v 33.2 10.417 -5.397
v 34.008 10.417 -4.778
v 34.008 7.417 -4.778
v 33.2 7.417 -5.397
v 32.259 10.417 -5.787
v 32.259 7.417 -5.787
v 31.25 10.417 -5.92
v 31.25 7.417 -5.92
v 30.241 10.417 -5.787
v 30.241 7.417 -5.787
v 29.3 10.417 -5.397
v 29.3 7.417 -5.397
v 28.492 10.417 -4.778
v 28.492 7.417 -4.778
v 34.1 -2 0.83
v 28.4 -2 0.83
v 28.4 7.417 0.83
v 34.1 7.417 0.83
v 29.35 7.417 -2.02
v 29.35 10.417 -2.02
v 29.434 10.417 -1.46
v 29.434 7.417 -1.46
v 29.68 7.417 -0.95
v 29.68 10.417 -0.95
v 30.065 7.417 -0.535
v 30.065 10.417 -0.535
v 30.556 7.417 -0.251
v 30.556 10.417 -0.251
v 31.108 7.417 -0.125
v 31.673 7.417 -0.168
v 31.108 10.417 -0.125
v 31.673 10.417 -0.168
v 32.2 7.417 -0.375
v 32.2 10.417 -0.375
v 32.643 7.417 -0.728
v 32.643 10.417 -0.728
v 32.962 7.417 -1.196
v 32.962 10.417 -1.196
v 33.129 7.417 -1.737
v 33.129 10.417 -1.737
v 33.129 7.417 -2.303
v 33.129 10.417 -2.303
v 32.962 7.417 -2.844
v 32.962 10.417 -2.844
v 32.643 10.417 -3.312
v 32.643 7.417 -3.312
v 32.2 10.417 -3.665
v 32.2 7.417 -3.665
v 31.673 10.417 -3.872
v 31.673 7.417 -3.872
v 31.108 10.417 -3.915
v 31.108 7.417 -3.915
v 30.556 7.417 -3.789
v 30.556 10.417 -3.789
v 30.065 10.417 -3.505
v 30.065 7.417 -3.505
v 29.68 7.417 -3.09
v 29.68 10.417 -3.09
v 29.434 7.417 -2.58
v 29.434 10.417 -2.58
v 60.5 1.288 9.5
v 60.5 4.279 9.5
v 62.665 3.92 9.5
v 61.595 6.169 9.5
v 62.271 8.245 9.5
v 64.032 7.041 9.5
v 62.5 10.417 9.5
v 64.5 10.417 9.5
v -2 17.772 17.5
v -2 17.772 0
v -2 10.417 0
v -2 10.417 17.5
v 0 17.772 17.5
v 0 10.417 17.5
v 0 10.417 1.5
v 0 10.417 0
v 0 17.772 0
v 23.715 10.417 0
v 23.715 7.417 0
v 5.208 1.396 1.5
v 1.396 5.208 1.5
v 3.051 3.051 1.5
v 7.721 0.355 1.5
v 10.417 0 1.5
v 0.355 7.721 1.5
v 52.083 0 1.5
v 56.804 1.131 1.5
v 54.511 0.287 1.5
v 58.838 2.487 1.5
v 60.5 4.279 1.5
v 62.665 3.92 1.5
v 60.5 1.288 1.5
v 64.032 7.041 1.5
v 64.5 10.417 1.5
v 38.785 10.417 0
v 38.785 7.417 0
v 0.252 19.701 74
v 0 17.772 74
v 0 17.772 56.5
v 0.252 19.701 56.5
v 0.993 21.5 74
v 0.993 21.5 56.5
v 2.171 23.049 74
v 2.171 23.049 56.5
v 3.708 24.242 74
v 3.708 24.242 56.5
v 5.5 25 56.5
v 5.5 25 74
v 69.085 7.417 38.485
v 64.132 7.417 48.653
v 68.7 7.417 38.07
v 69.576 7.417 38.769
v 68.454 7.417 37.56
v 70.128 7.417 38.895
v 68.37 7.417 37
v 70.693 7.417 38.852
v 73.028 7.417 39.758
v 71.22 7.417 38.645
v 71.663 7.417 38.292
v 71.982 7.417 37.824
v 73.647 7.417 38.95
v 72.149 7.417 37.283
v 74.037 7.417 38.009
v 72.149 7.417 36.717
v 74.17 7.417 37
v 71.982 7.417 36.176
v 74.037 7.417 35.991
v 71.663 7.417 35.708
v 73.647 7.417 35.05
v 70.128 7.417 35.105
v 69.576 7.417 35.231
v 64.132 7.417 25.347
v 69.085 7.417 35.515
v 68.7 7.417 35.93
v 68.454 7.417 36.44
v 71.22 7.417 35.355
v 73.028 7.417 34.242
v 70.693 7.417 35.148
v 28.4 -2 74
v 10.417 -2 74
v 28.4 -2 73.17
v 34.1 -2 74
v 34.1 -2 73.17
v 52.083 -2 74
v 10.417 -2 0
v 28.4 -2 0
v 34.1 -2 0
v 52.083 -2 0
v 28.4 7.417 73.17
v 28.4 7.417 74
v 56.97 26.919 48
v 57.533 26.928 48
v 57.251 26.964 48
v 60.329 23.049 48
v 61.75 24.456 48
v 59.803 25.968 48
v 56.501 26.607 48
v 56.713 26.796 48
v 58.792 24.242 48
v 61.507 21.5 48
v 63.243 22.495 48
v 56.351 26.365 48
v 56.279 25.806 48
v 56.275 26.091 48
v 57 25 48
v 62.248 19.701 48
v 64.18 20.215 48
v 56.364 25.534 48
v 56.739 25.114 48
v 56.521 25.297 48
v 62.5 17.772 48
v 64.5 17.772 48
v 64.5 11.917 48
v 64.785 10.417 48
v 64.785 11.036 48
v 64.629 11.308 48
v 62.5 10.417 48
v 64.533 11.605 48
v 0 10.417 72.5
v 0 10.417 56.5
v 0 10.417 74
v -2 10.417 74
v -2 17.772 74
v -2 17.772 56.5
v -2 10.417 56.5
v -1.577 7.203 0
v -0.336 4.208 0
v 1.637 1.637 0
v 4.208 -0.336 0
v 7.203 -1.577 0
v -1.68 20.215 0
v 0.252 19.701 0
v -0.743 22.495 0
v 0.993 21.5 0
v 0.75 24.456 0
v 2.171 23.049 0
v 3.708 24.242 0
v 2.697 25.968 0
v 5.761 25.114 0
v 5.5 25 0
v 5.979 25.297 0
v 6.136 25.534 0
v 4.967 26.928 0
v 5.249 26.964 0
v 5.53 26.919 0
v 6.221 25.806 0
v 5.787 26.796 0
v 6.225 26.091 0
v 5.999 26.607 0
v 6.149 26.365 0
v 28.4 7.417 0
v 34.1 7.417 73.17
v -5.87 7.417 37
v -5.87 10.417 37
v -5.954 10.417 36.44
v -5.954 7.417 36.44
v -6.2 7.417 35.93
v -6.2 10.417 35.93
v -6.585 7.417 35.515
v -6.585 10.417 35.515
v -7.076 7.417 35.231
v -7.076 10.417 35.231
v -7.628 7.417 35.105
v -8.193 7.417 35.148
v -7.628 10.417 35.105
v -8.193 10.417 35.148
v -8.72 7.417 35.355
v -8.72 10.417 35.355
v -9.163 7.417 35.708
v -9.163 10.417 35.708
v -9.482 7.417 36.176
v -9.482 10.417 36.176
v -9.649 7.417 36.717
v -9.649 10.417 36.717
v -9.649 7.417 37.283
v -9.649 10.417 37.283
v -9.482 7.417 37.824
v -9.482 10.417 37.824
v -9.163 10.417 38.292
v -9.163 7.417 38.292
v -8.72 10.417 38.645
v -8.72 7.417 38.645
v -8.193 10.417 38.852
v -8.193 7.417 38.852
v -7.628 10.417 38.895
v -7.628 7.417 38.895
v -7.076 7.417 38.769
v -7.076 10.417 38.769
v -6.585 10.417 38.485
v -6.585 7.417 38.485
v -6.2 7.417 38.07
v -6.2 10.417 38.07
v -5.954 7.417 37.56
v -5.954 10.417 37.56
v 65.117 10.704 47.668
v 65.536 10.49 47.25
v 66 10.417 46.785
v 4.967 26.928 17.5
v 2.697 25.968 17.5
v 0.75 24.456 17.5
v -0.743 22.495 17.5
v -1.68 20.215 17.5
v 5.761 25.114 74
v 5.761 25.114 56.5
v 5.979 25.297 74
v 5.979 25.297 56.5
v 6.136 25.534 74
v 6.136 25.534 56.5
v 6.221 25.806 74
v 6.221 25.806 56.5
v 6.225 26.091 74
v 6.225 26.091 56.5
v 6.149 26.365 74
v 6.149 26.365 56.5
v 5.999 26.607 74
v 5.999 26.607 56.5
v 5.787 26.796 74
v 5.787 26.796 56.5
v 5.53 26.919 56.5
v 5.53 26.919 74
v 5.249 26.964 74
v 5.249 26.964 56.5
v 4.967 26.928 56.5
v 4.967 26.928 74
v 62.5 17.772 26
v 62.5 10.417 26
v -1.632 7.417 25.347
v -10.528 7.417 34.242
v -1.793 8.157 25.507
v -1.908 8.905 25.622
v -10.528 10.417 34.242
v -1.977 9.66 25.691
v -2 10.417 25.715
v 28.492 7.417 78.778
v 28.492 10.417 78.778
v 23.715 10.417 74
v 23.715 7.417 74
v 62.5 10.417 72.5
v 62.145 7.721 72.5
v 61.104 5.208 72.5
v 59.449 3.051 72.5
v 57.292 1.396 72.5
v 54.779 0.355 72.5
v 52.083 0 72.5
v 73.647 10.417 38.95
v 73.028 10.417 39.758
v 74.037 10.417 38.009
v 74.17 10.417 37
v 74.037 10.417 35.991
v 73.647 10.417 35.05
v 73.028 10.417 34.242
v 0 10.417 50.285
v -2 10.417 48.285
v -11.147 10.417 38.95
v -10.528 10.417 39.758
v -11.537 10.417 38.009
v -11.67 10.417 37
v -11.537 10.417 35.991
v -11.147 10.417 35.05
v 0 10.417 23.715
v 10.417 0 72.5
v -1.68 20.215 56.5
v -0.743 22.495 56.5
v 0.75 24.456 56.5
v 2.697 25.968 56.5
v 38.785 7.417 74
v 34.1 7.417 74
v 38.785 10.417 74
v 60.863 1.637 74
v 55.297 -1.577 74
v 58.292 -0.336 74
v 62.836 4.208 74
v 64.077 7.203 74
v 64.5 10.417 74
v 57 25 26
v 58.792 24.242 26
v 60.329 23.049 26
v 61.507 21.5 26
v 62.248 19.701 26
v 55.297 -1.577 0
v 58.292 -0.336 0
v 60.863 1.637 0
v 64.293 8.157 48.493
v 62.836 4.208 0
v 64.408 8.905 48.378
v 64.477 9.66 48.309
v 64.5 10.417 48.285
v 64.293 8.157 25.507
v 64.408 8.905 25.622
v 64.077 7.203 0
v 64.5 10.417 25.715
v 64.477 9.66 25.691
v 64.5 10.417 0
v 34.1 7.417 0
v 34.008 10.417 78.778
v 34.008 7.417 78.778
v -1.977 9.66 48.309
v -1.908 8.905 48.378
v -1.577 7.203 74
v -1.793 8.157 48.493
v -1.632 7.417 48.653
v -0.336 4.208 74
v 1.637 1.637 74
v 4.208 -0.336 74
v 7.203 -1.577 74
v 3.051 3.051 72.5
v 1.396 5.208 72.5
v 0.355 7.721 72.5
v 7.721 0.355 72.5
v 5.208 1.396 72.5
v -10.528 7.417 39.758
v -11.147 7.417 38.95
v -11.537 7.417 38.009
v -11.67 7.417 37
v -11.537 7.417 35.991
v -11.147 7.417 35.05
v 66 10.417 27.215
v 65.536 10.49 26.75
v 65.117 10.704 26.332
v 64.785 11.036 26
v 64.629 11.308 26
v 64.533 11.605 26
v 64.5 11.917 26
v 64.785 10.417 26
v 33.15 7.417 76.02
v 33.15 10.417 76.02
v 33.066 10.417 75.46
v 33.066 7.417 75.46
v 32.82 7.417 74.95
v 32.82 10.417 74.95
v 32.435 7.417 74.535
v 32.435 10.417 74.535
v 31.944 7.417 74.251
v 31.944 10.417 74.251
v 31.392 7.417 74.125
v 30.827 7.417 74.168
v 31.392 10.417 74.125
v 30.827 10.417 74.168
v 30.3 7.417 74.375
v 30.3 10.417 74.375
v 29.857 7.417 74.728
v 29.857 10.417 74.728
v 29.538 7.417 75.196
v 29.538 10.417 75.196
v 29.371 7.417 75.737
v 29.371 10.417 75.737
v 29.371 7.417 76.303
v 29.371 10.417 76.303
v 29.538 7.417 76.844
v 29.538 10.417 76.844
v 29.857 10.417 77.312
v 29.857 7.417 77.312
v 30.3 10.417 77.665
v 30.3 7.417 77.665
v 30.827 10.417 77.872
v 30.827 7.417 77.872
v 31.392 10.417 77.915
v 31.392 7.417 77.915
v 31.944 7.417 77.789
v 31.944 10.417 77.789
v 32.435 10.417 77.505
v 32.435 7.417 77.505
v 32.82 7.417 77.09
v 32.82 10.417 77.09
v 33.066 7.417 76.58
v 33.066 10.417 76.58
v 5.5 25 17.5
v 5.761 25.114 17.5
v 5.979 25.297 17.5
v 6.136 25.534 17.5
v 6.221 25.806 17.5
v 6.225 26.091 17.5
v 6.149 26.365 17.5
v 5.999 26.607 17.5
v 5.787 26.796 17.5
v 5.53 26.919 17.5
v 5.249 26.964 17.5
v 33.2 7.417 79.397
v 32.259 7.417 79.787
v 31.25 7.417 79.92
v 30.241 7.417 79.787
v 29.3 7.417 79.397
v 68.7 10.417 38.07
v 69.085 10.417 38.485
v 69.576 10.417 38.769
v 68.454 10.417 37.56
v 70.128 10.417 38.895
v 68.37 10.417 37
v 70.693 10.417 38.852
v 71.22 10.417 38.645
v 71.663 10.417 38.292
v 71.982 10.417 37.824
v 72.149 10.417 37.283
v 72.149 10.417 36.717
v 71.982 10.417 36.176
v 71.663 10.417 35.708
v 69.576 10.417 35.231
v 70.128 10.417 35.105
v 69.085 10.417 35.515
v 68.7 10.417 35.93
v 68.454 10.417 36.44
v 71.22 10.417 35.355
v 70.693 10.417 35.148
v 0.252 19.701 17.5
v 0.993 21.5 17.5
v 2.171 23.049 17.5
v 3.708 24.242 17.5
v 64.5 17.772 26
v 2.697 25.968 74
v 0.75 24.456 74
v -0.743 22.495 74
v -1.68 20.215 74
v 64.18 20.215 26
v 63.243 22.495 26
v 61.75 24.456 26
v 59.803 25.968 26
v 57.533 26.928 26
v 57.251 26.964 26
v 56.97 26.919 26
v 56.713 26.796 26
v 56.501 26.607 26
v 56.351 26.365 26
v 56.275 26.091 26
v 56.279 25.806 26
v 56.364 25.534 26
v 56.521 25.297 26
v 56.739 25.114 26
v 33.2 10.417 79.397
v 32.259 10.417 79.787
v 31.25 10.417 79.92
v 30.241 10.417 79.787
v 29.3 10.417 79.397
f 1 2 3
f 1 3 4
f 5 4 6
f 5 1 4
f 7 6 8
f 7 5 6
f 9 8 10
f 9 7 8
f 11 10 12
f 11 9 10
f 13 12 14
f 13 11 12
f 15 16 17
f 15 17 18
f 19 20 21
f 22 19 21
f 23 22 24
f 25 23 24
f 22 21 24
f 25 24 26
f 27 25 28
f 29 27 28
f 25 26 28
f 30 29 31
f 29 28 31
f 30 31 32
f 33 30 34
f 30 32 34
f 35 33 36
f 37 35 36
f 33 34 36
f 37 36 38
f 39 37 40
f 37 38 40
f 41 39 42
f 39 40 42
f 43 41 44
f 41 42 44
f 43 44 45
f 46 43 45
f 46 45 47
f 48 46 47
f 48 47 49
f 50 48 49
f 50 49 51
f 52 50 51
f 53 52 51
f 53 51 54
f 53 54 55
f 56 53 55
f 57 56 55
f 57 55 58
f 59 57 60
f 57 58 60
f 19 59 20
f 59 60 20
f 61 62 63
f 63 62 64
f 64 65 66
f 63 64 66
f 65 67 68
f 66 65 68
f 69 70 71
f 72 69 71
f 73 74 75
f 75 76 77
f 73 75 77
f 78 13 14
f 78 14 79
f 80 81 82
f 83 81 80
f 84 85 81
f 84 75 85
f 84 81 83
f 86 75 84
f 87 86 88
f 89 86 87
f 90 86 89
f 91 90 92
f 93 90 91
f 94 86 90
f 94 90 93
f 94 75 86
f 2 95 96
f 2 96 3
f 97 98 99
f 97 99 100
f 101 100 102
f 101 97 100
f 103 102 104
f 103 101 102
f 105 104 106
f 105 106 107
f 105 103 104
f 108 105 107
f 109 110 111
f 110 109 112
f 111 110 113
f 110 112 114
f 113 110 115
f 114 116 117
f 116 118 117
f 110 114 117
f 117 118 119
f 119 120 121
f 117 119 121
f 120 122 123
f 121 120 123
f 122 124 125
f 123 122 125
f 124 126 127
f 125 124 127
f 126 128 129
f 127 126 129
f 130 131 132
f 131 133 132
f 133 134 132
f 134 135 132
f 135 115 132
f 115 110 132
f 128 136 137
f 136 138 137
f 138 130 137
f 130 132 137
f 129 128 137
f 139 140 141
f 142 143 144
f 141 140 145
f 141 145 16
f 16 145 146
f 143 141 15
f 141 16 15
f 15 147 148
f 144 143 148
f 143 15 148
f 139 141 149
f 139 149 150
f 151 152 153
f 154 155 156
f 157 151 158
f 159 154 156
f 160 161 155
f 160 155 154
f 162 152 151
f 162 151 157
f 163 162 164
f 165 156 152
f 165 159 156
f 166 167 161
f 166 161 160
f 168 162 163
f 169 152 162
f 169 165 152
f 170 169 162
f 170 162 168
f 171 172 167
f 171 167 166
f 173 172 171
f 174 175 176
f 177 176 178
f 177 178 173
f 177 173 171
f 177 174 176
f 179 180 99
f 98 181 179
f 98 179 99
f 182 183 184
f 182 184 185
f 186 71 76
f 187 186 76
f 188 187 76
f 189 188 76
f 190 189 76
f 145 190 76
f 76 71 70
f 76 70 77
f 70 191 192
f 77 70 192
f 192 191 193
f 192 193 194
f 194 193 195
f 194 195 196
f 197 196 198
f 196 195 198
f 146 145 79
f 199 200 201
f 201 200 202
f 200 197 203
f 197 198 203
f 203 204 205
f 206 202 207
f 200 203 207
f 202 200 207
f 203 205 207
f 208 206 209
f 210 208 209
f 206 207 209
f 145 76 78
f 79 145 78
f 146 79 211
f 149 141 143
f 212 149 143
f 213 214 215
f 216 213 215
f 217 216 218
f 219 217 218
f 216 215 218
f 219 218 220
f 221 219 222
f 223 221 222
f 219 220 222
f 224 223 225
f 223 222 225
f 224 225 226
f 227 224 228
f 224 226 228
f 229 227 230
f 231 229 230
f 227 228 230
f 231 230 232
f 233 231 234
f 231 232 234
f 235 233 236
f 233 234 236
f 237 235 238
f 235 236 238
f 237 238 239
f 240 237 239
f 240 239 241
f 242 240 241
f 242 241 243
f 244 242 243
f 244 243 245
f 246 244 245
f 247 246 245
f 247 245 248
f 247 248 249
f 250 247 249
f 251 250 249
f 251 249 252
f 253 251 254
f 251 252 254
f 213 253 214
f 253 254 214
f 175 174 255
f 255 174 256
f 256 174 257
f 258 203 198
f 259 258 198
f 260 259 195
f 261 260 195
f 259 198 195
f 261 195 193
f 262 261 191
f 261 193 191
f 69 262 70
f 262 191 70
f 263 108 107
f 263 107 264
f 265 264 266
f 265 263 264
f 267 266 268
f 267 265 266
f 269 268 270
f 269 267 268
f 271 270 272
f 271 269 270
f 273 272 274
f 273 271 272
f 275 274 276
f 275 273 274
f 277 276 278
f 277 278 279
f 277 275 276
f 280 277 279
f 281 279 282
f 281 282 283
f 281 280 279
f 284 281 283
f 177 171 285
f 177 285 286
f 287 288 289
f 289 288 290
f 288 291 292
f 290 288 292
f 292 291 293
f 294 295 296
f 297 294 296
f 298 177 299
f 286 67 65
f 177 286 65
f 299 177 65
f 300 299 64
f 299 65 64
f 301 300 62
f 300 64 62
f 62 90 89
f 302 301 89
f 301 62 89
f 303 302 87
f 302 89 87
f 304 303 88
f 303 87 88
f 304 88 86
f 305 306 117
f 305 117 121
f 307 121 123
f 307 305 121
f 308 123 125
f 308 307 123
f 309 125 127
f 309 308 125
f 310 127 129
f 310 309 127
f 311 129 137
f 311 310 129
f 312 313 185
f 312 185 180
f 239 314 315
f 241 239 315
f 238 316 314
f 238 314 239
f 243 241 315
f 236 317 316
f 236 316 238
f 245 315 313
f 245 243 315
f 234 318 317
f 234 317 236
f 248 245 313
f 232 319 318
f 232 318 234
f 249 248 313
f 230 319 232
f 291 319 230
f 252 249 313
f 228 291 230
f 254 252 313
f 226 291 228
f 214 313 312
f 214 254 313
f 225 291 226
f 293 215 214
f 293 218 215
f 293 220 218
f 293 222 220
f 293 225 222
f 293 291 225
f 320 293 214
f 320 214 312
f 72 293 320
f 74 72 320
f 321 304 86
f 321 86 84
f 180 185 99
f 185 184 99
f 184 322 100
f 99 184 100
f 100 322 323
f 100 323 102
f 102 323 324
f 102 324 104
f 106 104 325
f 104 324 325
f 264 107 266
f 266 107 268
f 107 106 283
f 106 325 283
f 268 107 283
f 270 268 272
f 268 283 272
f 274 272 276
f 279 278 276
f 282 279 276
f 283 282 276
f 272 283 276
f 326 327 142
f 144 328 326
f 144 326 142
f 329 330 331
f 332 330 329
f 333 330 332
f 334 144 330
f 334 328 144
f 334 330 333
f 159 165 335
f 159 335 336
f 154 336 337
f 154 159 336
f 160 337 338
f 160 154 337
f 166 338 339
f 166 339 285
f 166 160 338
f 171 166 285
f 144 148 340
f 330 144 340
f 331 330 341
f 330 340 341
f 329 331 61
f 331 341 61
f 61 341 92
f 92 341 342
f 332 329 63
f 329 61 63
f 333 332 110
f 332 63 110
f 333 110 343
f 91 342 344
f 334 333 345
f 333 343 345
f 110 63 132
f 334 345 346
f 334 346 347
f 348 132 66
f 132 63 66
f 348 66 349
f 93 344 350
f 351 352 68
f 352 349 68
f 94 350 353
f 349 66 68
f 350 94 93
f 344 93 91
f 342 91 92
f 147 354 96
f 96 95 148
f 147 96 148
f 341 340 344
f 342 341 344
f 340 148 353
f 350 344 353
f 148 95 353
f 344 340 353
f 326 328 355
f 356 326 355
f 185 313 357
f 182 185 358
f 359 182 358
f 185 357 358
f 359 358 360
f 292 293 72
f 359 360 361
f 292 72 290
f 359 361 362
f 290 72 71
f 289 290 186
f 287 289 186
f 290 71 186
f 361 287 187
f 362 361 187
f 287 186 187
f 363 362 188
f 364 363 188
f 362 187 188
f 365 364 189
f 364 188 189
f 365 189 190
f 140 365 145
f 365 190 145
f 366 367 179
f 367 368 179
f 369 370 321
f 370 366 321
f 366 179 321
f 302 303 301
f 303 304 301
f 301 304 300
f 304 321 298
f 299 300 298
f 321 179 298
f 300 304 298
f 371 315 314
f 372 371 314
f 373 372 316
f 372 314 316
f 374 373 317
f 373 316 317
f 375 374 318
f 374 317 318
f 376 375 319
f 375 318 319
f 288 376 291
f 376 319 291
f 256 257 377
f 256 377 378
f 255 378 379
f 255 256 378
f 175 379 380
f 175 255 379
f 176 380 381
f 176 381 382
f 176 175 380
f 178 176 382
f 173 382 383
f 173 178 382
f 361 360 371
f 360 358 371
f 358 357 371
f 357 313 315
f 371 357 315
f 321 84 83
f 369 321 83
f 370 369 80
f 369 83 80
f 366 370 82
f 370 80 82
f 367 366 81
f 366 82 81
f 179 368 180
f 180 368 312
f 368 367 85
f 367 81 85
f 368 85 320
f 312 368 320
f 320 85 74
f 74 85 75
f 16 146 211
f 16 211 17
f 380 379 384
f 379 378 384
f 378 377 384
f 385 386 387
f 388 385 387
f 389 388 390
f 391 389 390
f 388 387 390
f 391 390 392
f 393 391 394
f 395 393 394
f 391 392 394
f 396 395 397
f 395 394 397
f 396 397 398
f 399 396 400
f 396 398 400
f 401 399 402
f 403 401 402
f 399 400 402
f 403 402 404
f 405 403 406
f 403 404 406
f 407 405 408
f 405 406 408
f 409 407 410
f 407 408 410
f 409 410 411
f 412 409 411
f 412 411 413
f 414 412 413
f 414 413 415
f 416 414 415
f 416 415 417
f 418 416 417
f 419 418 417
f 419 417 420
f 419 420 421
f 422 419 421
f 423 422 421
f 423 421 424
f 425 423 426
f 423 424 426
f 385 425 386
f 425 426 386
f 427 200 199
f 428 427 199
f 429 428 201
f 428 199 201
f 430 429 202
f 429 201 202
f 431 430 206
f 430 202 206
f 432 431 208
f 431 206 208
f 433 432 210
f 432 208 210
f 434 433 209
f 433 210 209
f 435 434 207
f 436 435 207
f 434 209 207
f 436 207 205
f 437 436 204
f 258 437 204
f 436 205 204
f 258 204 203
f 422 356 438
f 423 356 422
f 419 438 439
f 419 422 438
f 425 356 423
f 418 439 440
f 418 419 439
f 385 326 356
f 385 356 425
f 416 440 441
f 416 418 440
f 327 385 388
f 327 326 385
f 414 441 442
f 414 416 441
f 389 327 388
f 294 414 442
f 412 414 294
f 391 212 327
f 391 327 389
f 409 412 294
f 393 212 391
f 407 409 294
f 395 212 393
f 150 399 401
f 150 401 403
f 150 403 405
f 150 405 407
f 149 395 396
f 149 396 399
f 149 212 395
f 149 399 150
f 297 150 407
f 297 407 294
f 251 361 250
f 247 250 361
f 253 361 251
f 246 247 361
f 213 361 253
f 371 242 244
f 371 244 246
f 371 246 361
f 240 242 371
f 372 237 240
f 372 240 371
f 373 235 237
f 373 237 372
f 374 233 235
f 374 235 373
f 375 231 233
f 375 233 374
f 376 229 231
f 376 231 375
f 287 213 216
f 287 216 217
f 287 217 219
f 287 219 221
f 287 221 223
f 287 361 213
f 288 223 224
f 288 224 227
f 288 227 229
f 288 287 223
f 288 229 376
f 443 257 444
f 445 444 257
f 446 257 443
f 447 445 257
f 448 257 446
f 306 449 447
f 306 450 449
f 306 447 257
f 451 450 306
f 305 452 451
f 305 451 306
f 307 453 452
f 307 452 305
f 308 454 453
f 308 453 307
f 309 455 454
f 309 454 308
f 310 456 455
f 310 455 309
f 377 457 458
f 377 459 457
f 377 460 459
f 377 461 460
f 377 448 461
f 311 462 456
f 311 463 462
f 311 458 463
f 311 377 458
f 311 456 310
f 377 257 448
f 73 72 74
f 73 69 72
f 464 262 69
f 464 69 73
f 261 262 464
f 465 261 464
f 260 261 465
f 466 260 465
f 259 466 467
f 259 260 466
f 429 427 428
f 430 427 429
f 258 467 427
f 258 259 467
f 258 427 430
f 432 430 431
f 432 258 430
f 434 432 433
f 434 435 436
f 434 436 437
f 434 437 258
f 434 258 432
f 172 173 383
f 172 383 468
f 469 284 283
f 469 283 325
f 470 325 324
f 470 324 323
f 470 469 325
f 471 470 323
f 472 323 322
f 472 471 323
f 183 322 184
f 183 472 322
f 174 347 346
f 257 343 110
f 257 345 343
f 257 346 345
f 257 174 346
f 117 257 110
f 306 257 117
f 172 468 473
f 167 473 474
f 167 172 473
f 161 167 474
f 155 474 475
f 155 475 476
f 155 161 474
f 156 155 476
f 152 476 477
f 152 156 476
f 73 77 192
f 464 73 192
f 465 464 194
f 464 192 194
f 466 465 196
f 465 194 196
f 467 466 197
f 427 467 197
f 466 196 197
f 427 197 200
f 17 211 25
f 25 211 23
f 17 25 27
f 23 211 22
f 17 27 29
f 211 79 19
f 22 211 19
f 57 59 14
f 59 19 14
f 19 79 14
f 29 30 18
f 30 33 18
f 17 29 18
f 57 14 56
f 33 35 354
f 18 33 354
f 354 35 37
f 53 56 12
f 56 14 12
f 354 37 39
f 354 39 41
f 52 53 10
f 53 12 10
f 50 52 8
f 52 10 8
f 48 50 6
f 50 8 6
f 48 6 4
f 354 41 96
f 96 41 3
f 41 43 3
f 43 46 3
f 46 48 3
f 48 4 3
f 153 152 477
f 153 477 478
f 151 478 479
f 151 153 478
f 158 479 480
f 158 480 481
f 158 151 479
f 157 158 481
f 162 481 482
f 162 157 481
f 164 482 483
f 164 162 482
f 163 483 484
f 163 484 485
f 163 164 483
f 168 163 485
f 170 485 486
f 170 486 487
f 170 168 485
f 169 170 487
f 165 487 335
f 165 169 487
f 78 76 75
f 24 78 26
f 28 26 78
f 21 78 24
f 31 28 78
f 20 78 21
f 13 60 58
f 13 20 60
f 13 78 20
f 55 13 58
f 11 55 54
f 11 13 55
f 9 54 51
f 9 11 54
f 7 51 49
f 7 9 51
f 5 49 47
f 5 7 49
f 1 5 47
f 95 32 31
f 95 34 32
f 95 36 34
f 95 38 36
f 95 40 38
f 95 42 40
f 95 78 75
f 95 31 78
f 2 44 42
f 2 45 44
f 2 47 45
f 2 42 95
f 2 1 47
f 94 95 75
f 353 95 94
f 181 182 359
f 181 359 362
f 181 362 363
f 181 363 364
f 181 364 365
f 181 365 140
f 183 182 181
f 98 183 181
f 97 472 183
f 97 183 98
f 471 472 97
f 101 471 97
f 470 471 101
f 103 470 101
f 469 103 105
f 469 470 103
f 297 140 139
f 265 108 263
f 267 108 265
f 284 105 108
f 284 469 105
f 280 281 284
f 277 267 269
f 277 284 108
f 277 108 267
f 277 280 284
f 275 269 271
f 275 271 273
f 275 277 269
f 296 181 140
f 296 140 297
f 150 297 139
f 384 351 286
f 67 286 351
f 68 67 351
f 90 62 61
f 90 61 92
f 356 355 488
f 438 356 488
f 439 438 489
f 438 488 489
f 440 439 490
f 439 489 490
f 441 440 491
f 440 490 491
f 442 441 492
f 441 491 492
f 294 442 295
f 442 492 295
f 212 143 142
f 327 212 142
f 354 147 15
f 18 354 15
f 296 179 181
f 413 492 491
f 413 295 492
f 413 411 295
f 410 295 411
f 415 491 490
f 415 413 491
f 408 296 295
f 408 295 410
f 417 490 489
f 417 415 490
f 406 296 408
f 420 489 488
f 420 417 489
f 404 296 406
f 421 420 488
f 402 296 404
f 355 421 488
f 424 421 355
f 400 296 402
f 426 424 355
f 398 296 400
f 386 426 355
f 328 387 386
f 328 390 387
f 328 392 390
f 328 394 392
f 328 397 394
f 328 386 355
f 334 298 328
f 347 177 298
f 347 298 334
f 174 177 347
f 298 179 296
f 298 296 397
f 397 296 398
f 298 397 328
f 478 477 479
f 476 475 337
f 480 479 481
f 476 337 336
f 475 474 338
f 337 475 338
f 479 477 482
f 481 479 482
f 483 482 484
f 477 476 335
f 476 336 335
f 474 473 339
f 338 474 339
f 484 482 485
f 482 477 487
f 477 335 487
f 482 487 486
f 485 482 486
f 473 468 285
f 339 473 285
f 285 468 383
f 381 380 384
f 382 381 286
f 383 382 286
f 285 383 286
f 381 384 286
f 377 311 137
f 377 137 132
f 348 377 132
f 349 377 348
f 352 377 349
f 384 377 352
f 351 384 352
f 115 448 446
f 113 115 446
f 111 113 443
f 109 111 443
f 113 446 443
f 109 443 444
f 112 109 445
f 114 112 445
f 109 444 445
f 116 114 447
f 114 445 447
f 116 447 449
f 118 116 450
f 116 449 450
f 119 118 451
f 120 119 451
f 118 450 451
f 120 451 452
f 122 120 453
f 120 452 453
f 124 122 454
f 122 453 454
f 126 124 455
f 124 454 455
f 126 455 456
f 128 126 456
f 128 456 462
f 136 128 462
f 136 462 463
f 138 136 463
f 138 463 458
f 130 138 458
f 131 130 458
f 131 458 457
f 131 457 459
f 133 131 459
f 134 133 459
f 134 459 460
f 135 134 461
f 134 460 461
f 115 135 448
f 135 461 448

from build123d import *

# Parameters (mm, degrees)
SKETCH1_R           = 10.416666668
SKETCH1_R_2         = 10.416666667
BOSS_EXTRUDE1_DEPTH = 65
FILLET1_R           = 2
BOSS_EXTRUDE2_DEPTH = 74
BOSS_EXTRUDE3_REACH = 100.947
SKETCH3_W           = 66.5
SKETCH3_H           = 1.5
SKETCH4_R           = 1.9
BOSS_EXTRUDE4_DEPTH = 3
SKETCH5_W           = 4
SKETCH5_H           = 8
CUT_EXTRUDE1_DEPTH  = 10
BOSS_EXTRUDE5_START = -26
BOSS_EXTRUDE5_DEPTH = 22
BOSS_EXTRUDE6_DEPTH = 17.5
FILLET2_R           = 1.5
SKETCH8_W           = 5.7
SKETCH8_H           = 0.83
CUT_EXTRUDE4_DEPTH  = 9.416666667


with BuildPart() as part:
    # Sketch1 → Boss-Extrude1 (new body)
    with BuildSketch(Plane.XY):
        with Locations((10.416666667, 10.416666667)):
            Circle(SKETCH1_R)
        with BuildLine():
            ThreePointArc((20.833333333, 10.416666667), (21.626254869, 14.402952421), (23.884304362, 17.782362305))
            ThreePointArc((23.884304363, 17.782362304), (20.833333333, 16.518608725), (17.782362304, 17.782362304))
            ThreePointArc((17.782362305, 17.782362305), (20.040411798, 14.402952421), (20.833333335, 10.416666667))
        make_face()
        with BuildLine():
            ThreePointArc((17.782362304, 3.050971029), (20.833333333, 4.314724608), (23.884304363, 3.050971029))
            ThreePointArc((23.884304362, 3.050971029), (21.626254869, 6.430380913), (20.833333333, 10.416666667))
            ThreePointArc((20.833333335, 10.416666667), (20.040411798, 6.430380912), (17.782362305, 3.050971028))
        make_face()
        with Locations((31.25, 10.416666667)):
            Circle(SKETCH1_R_2)
        with BuildLine():
            ThreePointArc((44.717637696, 3.050971029), (42.459588203, 6.430380913), (41.666666666, 10.416666667))
            ThreePointArc((41.666666667, 10.416666667), (40.873745131, 6.430380913), (38.615695638, 3.050971029))
            ThreePointArc((38.615695637, 3.050971029), (41.666666667, 4.314724608), (44.717637696, 3.050971029))
        make_face()
        with BuildLine():
            ThreePointArc((38.615695638, 17.782362305), (40.873745131, 14.402952421), (41.666666667, 10.416666667))
            ThreePointArc((41.666666666, 10.416666667), (42.459588203, 14.402952421), (44.717637696, 17.782362304))
            ThreePointArc((44.717637696, 17.782362304), (41.666666667, 16.518608725), (38.615695637, 17.782362304))
        make_face()
        with Locations((52.083333333, 10.416666667)):
            Circle(SKETCH1_R_2)
    extrude(amount=BOSS_EXTRUDE1_DEPTH)

    # Fillet1
    fillet1_edges = [part.edges().sort_by_distance(p)[0] for p in [
        (31.25, -1e-09, 65),
        (31.25, 20.833333334, 0),
        (41.666666667, 16.518608725, 0),
        (62.5, 10.416666667, 0),
        (41.666666667, 4.314724608, 0),
        (31.25, -1e-09, 0),
        (20.833333333, 4.314724608, 0),
        (41.666666667, 4.314724608, 65),
        (62.5, 10.416666667, 65),
        (41.666666667, 16.518608725, 65),
        (31.25, 20.833333334, 65),
        (20.833333333, 16.518608725, 65),
        (-1e-09, 10.416666667, 65),
        (20.833333333, 4.314724608, 65),
        (-1e-09, 10.416666667, 0),
        (20.833333333, 16.518608725, 0),
    ]]
    fillet(fillet1_edges, radius=FILLET1_R)


with BuildPart() as body_2:
    # Sketch2 → Boss-Extrude2 (new body)
    with BuildSketch(Plane(origin=(0, 0, 0), x_dir=(-1, 0, 0), z_dir=(0, 0, -1))):
        with BuildLine():
            Line((-52.083333333, 0), (-10.416666667, 0))
            ThreePointArc((-10.416666667, 0), (-3.050971029, 3.050971029), (1e-09, 10.416666667))
            Line((1e-09, 10.416666667), (2.000000001, 10.416666667))
            ThreePointArc((2.000000001, 10.416666667), (-1.636757467, 1.636757467), (-10.416666667, -2))
            Line((-10.416666667, -2), (-52.083333333, -2))
            ThreePointArc((-52.083333333, -2), (-60.863242533, 1.636757467), (-64.5, 10.416666667))
            Line((-64.5, 10.416666667), (-62.5, 10.416666667))
            ThreePointArc((-62.5, 10.416666667), (-59.449028971, 3.050971029), (-52.083333333, 0))
        make_face()
    extrude(amount=-BOSS_EXTRUDE2_DEPTH)

    # Sketch3 → Boss-Extrude3 (add, up to next)
    with BuildSketch(Plane(origin=(0, 10.416666667, 0), x_dir=(1, 0, 0), z_dir=(0, 1, 0)), mode=Mode.PRIVATE) as boss_extrude3_sk1:
        with Locations((31.25, -0.75)):
            Rectangle(SKETCH3_W, SKETCH3_H)
    boss_extrude3_tool1 = extrude(boss_extrude3_sk1.sketch, amount=-BOSS_EXTRUDE3_REACH, mode=Mode.PRIVATE) - body_2.part
    # Sketch3 → Boss-Extrude3 (add, up to next)
    with BuildSketch(Plane(origin=(0, 10.416666667, 0), x_dir=(1, 0, 0), z_dir=(0, 1, 0)), mode=Mode.PRIVATE) as boss_extrude3_sk2:
        with Locations((31.25, -73.25)):
            Rectangle(SKETCH3_W, SKETCH3_H)
    boss_extrude3_tool2 = extrude(boss_extrude3_sk2.sketch, amount=-BOSS_EXTRUDE3_REACH, mode=Mode.PRIVATE) - body_2.part
    add(boss_extrude3_tool1.solids().sort_by_distance((31.25, 10.416667, 0.75))[0])
    add(boss_extrude3_tool2.solids().sort_by_distance((31.25, 10.416667, 73.25))[0])

    # Sketch4 → Boss-Extrude4 (add)
    # profile 1 of 4: a face of its own
    with BuildSketch(Plane(origin=(0, 10.416666667, 0), x_dir=(1, 0, 0), z_dir=(0, 1, 0))):
        with BuildLine():
            Line((28.492283553, 4.777716447), (22.214567107, -1.5))
            Line((22.214567107, -1.5), (40.285432893, -1.5))
            Line((40.285432893, -1.5), (34.007716446, 4.777716447))
            ThreePointArc((34.007716446, 4.777716447), (31.25, 5.92), (28.492283553, 4.777716447))
        make_face()
        with Locations(Location((31.25, 2.02, 0), (0, 0, 180))):
            Circle(SKETCH4_R, mode=Mode.SUBTRACT)
    # profile 2 of 4: a face of its own
    with BuildSketch(Plane(origin=(0, 10.416666667, 0), x_dir=(1, 0, 0), z_dir=(0, 1, 0))):
        with BuildLine():
            Line((73.027716447, -34.242283553), (62.5, -23.714567107))
            Line((62.5, -23.714567107), (62.5, -50.285432893))
            Line((62.5, -50.285432893), (73.027716447, -39.757716447))
            ThreePointArc((73.027716447, -39.757716447), (74.17, -37), (73.027716447, -34.242283553))
        make_face()
        with Locations(Location((70.27, -37, 0), (0, 0, 180))):
            Circle(SKETCH4_R, mode=Mode.SUBTRACT)
    # profile 3 of 4: a face of its own
    with BuildSketch(Plane(origin=(0, 10.416666667, 0), x_dir=(1, 0, 0), z_dir=(0, 1, 0))):
        with BuildLine():
            Line((0, -23.714567107), (0, -50.285432893))
            Line((0, -50.285432893), (-10.527716447, -39.757716447))
            ThreePointArc((-10.527716447, -39.757716447), (-11.67, -37), (-10.527716447, -34.242283553))
            Line((-10.527716447, -34.242283553), (0, -23.714567107))
        make_face()
        with Locations((-7.77, -37)):
            Circle(SKETCH4_R, mode=Mode.SUBTRACT)
    # profile 4 of 4: a face of its own
    with BuildSketch(Plane(origin=(0, 10.416666667, 0), x_dir=(1, 0, 0), z_dir=(0, 1, 0))):
        with BuildLine():
            Line((22.214567107, -72.5), (40.285432893, -72.5))
            Line((40.285432893, -72.5), (34.007716446, -78.777716447))
            ThreePointArc((34.007716446, -78.777716447), (31.25, -79.92), (28.492283553, -78.777716447))
            Line((28.492283553, -78.777716447), (22.214567107, -72.5))
        make_face()
        with Locations((31.25, -76.02)):
            Circle(SKETCH4_R, mode=Mode.SUBTRACT)
    extrude(amount=-BOSS_EXTRUDE4_DEPTH)

    # Sketch5 → Cut-Extrude1 (cut)
    with BuildSketch(Plane(origin=(0, 10.416666667, 0), x_dir=(1, 0, 0), z_dir=(0, 1, 0))):
        with Locations((62.5, -5.5)):
            Rectangle(SKETCH5_W, SKETCH5_H)
    extrude(amount=-CUT_EXTRUDE1_DEPTH, mode=Mode.SUBTRACT)

    # Sketch6 → Boss-Extrude5 (add)
    with BuildSketch(Plane.XY.offset(74).offset(BOSS_EXTRUDE5_START)):
        with BuildLine():
            Line((62.5, 10.416666667), (64.5, 10.416666667))
            Line((64.5, 10.416666667), (64.5, 12.416666667))
            Line((64.5, 12.416666667), (64.5, 17.771583853))
            ThreePointArc((64.5, 17.771583853), (62.560313045, 23.524119525), (57.533333333, 26.927577639))
            ThreePointArc((57.533333333, 26.927577639), (56.302877847, 26.230455486), (57, 25))
            ThreePointArc((57, 25), (60.968668193, 22.313059384), (62.5, 17.771583853))
            Line((62.5, 17.771583853), (62.5, 10.416666667))
        make_face()
    extrude(amount=-BOSS_EXTRUDE5_DEPTH)

    # Sketch6<3> → Boss-Extrude6 (add)
    with BuildSketch(Plane.XY.offset(74)):
        with BuildLine():
            Line((-2, 12.416666667), (-2, 10.416666667))
            Line((-2, 10.416666667), (0, 10.416666667))
            Line((0, 10.416666667), (0, 17.771583853))
            ThreePointArc((0, 17.771583853), (1.531331806, 22.313059384), (5.5, 25))
            ThreePointArc((5.5, 25), (6.197122153, 26.230455486), (4.966666666, 26.927577639))
            ThreePointArc((4.966666666, 26.927577639), (-0.060313045, 23.524119525), (-2, 17.771583853))
            Line((-2, 17.771583853), (-2, 12.416666667))
        make_face()
    boss_extrude6 = extrude(amount=-BOSS_EXTRUDE6_DEPTH)

    # Mirror1: Boss-Extrude6 across plane
    add(boss_extrude6.mirror(Plane.XY.offset(37)))

    # Fillet2
    # the kernel refuses this fillet: 1.5 mm, written as the material it adds along each edge
    with BuildSketch(Plane(origin=(64.5, 10.416666667, 48), x_dir=(1, 0, 0), z_dir=(0, 0, -1))) as fillet2_piece_1_section:
        with BuildLine():
            CenterArc((FILLET2_R, -FILLET2_R), FILLET2_R, 90, 90)
            Line((0, -FILLET2_R), (0, 0))
            Line((0, 0), (FILLET2_R, 0))
        make_face()
    fillet2_piece_1 = extrude(amount=22, mode=Mode.PRIVATE)
    fillet2_piece_1 = split(fillet2_piece_1, bisect_by=Plane(origin=(70.314772408, 10.761109215, 42.470660485), z_dir=(-0.7071067811865509, 0, -0.7071067811865442)), keep=Keep.TOP, mode=Mode.PRIVATE)
    fillet2_piece_1 = split(fillet2_piece_1, bisect_by=Plane(origin=(70.314772408, 10.761109215, 31.529339515), z_dir=(-0.7071067811865515, 0, 0.7071067811865436)), keep=Keep.TOP, mode=Mode.PRIVATE)
    add(fillet2_piece_1)

    # Sketch8 → Cut-Extrude4 (cut)
    with BuildSketch(Plane.XZ.offset(2)):
        with Locations((31.25, 0.415)):
            Rectangle(SKETCH8_W, SKETCH8_H)
        with Locations((31.25, 73.585)):
            Rectangle(SKETCH8_W, SKETCH8_H)
    extrude(amount=-CUT_EXTRUDE4_DEPTH, mode=Mode.SUBTRACT)


solid = body_2.part
